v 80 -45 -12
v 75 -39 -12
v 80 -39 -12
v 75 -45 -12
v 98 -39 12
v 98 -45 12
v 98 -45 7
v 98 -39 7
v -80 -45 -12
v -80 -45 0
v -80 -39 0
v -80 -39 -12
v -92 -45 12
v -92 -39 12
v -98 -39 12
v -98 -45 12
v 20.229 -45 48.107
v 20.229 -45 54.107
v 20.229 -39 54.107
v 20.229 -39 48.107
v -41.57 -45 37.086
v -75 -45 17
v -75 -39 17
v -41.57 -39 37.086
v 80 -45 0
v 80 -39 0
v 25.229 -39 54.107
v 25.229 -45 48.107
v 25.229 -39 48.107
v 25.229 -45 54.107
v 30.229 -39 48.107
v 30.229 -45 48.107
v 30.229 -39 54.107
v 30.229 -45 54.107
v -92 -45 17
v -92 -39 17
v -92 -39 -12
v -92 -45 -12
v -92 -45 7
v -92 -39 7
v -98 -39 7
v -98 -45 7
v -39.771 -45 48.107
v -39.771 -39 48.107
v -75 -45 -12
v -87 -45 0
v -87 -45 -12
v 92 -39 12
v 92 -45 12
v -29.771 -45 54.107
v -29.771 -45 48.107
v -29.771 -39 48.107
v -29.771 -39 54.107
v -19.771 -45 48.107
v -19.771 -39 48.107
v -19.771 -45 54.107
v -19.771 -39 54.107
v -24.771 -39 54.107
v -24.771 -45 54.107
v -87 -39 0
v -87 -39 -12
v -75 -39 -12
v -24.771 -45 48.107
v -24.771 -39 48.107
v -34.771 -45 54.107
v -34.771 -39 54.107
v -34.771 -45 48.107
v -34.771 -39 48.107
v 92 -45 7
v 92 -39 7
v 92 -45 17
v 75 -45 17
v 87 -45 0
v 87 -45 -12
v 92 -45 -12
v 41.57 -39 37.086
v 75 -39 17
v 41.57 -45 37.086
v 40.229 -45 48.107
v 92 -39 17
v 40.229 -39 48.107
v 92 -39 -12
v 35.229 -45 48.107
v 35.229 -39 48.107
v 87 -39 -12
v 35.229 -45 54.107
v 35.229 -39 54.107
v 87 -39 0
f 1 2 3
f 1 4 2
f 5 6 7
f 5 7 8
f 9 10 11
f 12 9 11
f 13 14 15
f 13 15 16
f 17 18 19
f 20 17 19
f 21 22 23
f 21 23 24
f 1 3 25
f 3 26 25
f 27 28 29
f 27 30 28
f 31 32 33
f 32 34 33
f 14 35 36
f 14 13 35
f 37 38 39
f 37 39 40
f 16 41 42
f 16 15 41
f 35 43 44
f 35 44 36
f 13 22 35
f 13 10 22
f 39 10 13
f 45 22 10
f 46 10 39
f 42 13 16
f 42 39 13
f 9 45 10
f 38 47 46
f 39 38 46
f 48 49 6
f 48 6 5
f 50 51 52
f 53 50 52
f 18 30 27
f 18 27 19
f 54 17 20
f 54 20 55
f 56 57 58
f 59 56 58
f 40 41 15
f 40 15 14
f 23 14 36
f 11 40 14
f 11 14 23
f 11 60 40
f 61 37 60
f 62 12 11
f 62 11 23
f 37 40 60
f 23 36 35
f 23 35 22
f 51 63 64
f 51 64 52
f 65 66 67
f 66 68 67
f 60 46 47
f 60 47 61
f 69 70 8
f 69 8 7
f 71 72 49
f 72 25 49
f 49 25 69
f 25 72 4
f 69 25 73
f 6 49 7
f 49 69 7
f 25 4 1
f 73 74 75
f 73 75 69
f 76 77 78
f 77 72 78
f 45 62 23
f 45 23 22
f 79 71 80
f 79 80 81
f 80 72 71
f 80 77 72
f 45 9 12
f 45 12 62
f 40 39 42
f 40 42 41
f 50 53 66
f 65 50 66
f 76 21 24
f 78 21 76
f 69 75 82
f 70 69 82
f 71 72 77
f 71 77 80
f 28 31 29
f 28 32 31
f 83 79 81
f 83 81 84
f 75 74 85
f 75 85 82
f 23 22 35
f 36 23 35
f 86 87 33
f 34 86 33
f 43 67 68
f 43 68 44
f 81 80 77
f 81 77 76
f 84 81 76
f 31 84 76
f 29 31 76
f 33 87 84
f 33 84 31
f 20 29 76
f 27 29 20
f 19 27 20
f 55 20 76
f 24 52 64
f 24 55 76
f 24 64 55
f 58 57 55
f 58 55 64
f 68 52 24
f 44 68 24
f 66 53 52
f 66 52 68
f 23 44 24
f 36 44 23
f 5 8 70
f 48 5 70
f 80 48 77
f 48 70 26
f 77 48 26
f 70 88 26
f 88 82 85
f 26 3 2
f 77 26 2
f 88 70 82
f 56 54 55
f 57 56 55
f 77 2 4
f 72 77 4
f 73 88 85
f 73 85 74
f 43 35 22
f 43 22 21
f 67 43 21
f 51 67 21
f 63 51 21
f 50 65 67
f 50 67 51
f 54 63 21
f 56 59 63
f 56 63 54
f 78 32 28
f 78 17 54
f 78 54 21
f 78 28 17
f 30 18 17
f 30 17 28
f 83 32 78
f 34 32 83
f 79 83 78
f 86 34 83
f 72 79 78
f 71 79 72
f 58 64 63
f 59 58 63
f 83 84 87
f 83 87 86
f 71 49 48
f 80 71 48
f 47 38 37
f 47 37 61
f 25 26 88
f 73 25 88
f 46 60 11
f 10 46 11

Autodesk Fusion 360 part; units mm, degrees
sketch "Sketch1" plane through (0, 0, 0) normal (0, 0, 1) x (1, 0, 0) in component "sidelegs"
  line L0 (-75, -45) -> (-92, -45)
  line L1 (-92, -45) -> (-92, -39)
  line L2 (-92, -39) -> (-75, -39)
  line L3 (-75, -39) -> (-75, -45)
  line L4 (75, -45) -> (92, -45)
  line L5 (92, -45) -> (92, -39)
  line L6 (92, -39) -> (75, -39)
  line L7 (75, -39) -> (75, -45)
  dimension "d7" = 17
  dimension "d8" = 6
  dimension "d9" = 17
  dimension "d10" = 6
extrude "Extrude1" add sketch "Sketch1" along normal blind 17 makes body 1 at (-80.6667, -45, 11.3333) makes body 2 at (86.3333, -39, 11.3333) in component "sidelegs"
sketch "Sketch2" plane through (0, -45, 0) normal (0, -1, 0) x (1, 0, 0) in component "sidelegs"
  line L0 (-92, 0) -> (-75, 0)
  line L1 (-75, 0) -> (-75, 17)
  line L2 (-75, 17) -> (-92, 17)
  line L3 (-92, 17) -> (-92, 0)
  line L4 (-75, 17) -> (-41.5705, 37.0865)
  line L5 (-75, 17) -> (-36, 17) construction
  line L6 (75, 17) -> (41.5705, 37.0865)
  line L7 (75, 17) -> (114, 17) construction
  line L8 (-41.5705, 37.0865) -> (41.5705, 37.0865)
  line L9 (92, 17) -> (40.2293, 48.107)
  line L10 (40.2293, 48.107) -> (-39.7707, 48.107)
  line L11 (-39.7707, 48.107) -> (-92, 17)
  line L12 (75, 17) -> (92, 17)
  line L13 (-75, 17) -> (-92, 17)
  dimension "d13" = 39
  dimension "d14" = 31
  dimension "d15" = 149
  dimension "d16" = 39
  dimension "d25" = 80
extrude "Extrude2" add sketch "Sketch2" against normal blind 6 separate body contours L2 L4 L6 L8 L9 L10 L11 L12 L13 makes body 3 in component "sidelegs"
sketch "Sketch3" plane through (0, 0, 0) normal (0, 0, -1) x (1, 0, 0) in component "sidelegs"
  line L0 (-92, 39) -> (-75, 39)
  line L1 (-75, 39) -> (-75, 45)
  line L2 (-75, 45) -> (-92, 45)
  line L3 (-92, 45) -> (-92, 39)
  line L4 (-92, 45) -> (-87, 45)
  line L5 (-87, 45) -> (-87, 39)
  line L6 (-87, 39) -> (-92, 39)
  line L7 (-92, 39) -> (-92, 45)
  line L8 (-75, 45) -> (-80, 45)
  line L9 (-80, 45) -> (-80, 39)
  line L10 (-80, 39) -> (-75, 39)
  line L11 (-75, 39) -> (-75, 45)
extrude "Extrude3" add sketch "Sketch3" along normal blind 12 contours L0 L2 L3 L4 L5 L6 L7 | L0 L1 L2 L8 L9 L10 L11 bodies 1 in component "sidelegs"
ref_plane "WorkPlane1" through (0, 0, 0) normal (1, 0, 0) x (0, 1, 0) in component "sidelegs"
sketch "Sketch4" plane through (0, 0, 0) normal (0, 0, -1) x (1, 0, 0) in component "sidelegs"
  line L0 (75, 45) -> (75, 39)
  line L1 (75, 39) -> (92, 39)
  line L2 (92, 39) -> (92, 45)
  line L3 (92, 45) -> (75, 45)
  line L4 (92, 39) -> (87, 39)
  line L5 (87, 39) -> (87, 45)
  line L6 (87, 45) -> (92, 45)
  line L7 (92, 45) -> (92, 39)
  line L8 (75, 39) -> (80, 39)
  line L9 (80, 39) -> (80, 45)
  line L10 (80, 45) -> (75, 45)
  line L11 (75, 45) -> (75, 39)
extrude "Extrude4" add sketch "Sketch4" along normal blind 12 contours L0 L1 L3 L8 L9 L10 L11 | L1 L2 L3 L4 L5 L6 L7 bodies 2 in component "sidelegs"
sketch "Sketch5" plane through (0, 0, 48.107) normal (0, 0, 1) x (-1, 0, 0) in component "sidelegs"
  line L0 (39.7707, 45) -> (-40.2293, 45)
  line L1 (-40.2293, 45) -> (-40.2293, 39)
  line L2 (-40.2293, 39) -> (39.7707, 39)
  line L3 (39.7707, 39) -> (39.7707, 45)
  line L4 (-40.2293, 45) -> (-35.2293, 45) construction
  line L5 (-35.2293, 45) -> (-35.2293, 39) construction
  line L6 (-35.2293, 39) -> (-40.2293, 39) construction
  line L7 (-40.2293, 39) -> (-40.2293, 45) construction
  line L8 (39.7707, 45) -> (34.7707, 45) construction
  line L9 (34.7707, 45) -> (34.7707, 39) construction
  line L10 (34.7707, 39) -> (39.7707, 39) construction
  line L11 (39.7707, 39) -> (39.7707, 45) construction
  line L12 (-35.2293, 45) -> (-30.2293, 45) construction
  line L13 (-30.2293, 45) -> (-30.2293, 39) construction
  line L14 (-30.2293, 39) -> (-35.2293, 39) construction
  line L15 (-35.2293, 39) -> (-35.2293, 45) construction
  line L16 (-30, 45) -> (-25, 45) construction
  line L17 (-25, 45) -> (-25, 39) construction
  line L18 (-25, 39) -> (-30, 39) construction
  line L19 (-30, 39) -> (-30, 45) construction
  line L20 (34.7707, 45) -> (29.7707, 45) construction
  line L21 (29.7707, 45) -> (29.7707, 39) construction
  line L22 (29.7707, 39) -> (34.7707, 39) construction
  line L23 (34.7707, 39) -> (34.7707, 45) construction
  line L24 (29.7707, 45) -> (24.7707, 45) construction
  line L25 (24.7707, 45) -> (24.7707, 39) construction
  line L26 (24.7707, 39) -> (29.7707, 39) construction
  line L27 (29.7707, 39) -> (29.7707, 45) construction
  line L28 (34.7707, 45) -> (29.7707, 45)
  line L29 (29.7707, 45) -> (29.7707, 39)
  line L30 (29.7707, 39) -> (34.7707, 39)
  line L31 (34.7707, 39) -> (34.7707, 45)
  line L32 (-35.2293, 45) -> (-30, 45)
  line L33 (-30, 45) -> (-30, 39)
  line L34 (-30, 39) -> (-35.2293, 39)
  line L35 (-35.2293, 39) -> (-35.2293, 45)
  line L36 (-25, 45) -> (-20, 45)
  line L37 (-20, 45) -> (-20, 39)
  line L38 (-20, 39) -> (-25, 39)
  line L39 (-25, 39) -> (-25, 45)
  line L40 (24.7707, 45) -> (19.7707, 45)
  line L41 (19.7707, 45) -> (19.7707, 39)
  line L42 (19.7707, 39) -> (24.7707, 39)
  line L43 (24.7707, 39) -> (24.7707, 45)
  dimension "d26" = 5
  dimension "d27" = 5
  dimension "d28" = 5
  dimension "d29" = 5
  dimension "d30" = 5
  dimension "d31" = 5
  dimension "d32" = 5
extrude "Extrude5" add sketch "Sketch5" along normal blind 6 contours L0 L2 L28 L29 L30 L31 | L0 L2 L40 L41 L42 L43 | L0 L2 L36 L37 L38 L39 | L0 L2 L32 L33 L34 L35 bodies 3 in component "sidelegs"
sketch "Sketch6" plane through (-92, 0, 0) normal (-1, 0, 0) x (0, -1, 0) in component "sidelegs"
  line L0 (45, -12) -> (45, 17)
  line L1 (45, 17) -> (39, 17)
  line L2 (39, 17) -> (39, -12)
  line L3 (39, -12) -> (45, -12)
  line L4 (45, 17) -> (45, 0) construction
  line L5 (39, 0) -> (39, 17) construction
  line L6 (39, 17) -> (45, 17) construction
  line L7 (45, 17) -> (45, 12) construction
  line L8 (45, 12) -> (39, 12) construction
  line L9 (39, 12) -> (39, 17) construction
  line L10 (39, 12) -> (45, 12)
  line L11 (45, 12) -> (45, 7)
  line L12 (45, 7) -> (39, 7)
  line L13 (39, 7) -> (39, 12)
extrude "Extrude6" add sketch "Sketch6" along normal blind 6 contours L0 L2 L10 L11 L12 L13 bodies 1 in component "sidelegs"
sketch "Sketch7" plane through (92, 0, 0) normal (1, 0, 0) x (0, 1, 0) in component "sidelegs"
  line L0 (-39, -12) -> (-39, 17)
  line L1 (-39, 17) -> (-45, 17)
  line L2 (-45, 17) -> (-45, -12)
  line L3 (-45, -12) -> (-39, -12)
  line L4 (-45, 17) -> (-39, 17) construction
  line L5 (-39, 17) -> (-39, 12) construction
  line L6 (-39, 12) -> (-45, 12) construction
  line L7 (-45, 12) -> (-45, 17) construction
  line L8 (-45, 12) -> (-39, 12)
  line L9 (-39, 12) -> (-39, 7)
  line L10 (-39, 7) -> (-45, 7)
  line L11 (-45, 7) -> (-45, 12)
extrude "Extrude7" add sketch "Sketch7" along normal blind 6 contours L0 L2 L8 L9 L10 L11 bodies 2 in component "sidelegs"
sketch "Sketch8" plane through (0, 0, 54.107) normal (0, 0, 1) x (-1, 0, 0) in component "sidelegs"
  line L0 (-35.2293, 39) -> (-30, 39)
  line L1 (-30, 39) -> (-30, 45)
  line L2 (-30, 45) -> (-35.2293, 45)
  line L3 (-35.2293, 45) -> (-35.2293, 39)
  line L4 (-30, 42) -> (-30.229, 42) construction
  line L5 (-30.229, 42) -> (-30.229, 39) construction
  line L6 (-30.229, 42) -> (-30.229, 45) construction
  line L7 (-30.229, 45) -> (-30, 45) construction
  line L8 (-30, 45) -> (-30, 39) construction
  line L9 (-30, 39) -> (-30.229, 39) construction
  line L10 (-30.229, 39) -> (-30.229, 45) construction
  line L11 (-30, 45) -> (-30.229, 45)
  line L12 (-30.229, 45) -> (-30.229, 39)
  line L13 (-30.229, 39) -> (-30, 39)
  line L14 (-30, 39) -> (-30, 45)
  dimension "d39" = 0.229
extrude "Extrude8" cut sketch "Sketch8" against normal blind 6 contours L0 L1 L2 L11 L12 L13 L14 bodies 3 in component "sidelegs"
sketch "Sketch9" plane through (0, 0, 54.107) normal (0, 0, 1) x (-1, 0, 0) in component "sidelegs"
  line L0 (-25, 39) -> (-20, 39)
  line L1 (-20, 39) -> (-20, 45)
  line L2 (-20, 45) -> (-25, 45)
  line L3 (-25, 45) -> (-25, 39)
  line L4 (-25, 45) -> (-25.229, 45)
  line L5 (-25.229, 45) -> (-25.229, 39)
  line L6 (-25.229, 39) -> (-25, 39)
  line L7 (-20.229, 45) -> (-20.229, 39)
  dimension "d42" = 0.229
  dimension "d43" = 6
  dimension "d46" = 0.229
extrude "Extrude9" add sketch "Sketch9" against normal blind 6 contours L3 L4 L5 L6 bodies 3 in component "sidelegs"
extrude "Extrude10" cut sketch "Sketch9" against normal blind 6 contours L0 L1 L2 L7 bodies 3 in component "sidelegs"
component "sidelegs" placed x (1, 0, 0) y (0, 1, 0) z (0, 0, 1) at (0, 0, 0)
